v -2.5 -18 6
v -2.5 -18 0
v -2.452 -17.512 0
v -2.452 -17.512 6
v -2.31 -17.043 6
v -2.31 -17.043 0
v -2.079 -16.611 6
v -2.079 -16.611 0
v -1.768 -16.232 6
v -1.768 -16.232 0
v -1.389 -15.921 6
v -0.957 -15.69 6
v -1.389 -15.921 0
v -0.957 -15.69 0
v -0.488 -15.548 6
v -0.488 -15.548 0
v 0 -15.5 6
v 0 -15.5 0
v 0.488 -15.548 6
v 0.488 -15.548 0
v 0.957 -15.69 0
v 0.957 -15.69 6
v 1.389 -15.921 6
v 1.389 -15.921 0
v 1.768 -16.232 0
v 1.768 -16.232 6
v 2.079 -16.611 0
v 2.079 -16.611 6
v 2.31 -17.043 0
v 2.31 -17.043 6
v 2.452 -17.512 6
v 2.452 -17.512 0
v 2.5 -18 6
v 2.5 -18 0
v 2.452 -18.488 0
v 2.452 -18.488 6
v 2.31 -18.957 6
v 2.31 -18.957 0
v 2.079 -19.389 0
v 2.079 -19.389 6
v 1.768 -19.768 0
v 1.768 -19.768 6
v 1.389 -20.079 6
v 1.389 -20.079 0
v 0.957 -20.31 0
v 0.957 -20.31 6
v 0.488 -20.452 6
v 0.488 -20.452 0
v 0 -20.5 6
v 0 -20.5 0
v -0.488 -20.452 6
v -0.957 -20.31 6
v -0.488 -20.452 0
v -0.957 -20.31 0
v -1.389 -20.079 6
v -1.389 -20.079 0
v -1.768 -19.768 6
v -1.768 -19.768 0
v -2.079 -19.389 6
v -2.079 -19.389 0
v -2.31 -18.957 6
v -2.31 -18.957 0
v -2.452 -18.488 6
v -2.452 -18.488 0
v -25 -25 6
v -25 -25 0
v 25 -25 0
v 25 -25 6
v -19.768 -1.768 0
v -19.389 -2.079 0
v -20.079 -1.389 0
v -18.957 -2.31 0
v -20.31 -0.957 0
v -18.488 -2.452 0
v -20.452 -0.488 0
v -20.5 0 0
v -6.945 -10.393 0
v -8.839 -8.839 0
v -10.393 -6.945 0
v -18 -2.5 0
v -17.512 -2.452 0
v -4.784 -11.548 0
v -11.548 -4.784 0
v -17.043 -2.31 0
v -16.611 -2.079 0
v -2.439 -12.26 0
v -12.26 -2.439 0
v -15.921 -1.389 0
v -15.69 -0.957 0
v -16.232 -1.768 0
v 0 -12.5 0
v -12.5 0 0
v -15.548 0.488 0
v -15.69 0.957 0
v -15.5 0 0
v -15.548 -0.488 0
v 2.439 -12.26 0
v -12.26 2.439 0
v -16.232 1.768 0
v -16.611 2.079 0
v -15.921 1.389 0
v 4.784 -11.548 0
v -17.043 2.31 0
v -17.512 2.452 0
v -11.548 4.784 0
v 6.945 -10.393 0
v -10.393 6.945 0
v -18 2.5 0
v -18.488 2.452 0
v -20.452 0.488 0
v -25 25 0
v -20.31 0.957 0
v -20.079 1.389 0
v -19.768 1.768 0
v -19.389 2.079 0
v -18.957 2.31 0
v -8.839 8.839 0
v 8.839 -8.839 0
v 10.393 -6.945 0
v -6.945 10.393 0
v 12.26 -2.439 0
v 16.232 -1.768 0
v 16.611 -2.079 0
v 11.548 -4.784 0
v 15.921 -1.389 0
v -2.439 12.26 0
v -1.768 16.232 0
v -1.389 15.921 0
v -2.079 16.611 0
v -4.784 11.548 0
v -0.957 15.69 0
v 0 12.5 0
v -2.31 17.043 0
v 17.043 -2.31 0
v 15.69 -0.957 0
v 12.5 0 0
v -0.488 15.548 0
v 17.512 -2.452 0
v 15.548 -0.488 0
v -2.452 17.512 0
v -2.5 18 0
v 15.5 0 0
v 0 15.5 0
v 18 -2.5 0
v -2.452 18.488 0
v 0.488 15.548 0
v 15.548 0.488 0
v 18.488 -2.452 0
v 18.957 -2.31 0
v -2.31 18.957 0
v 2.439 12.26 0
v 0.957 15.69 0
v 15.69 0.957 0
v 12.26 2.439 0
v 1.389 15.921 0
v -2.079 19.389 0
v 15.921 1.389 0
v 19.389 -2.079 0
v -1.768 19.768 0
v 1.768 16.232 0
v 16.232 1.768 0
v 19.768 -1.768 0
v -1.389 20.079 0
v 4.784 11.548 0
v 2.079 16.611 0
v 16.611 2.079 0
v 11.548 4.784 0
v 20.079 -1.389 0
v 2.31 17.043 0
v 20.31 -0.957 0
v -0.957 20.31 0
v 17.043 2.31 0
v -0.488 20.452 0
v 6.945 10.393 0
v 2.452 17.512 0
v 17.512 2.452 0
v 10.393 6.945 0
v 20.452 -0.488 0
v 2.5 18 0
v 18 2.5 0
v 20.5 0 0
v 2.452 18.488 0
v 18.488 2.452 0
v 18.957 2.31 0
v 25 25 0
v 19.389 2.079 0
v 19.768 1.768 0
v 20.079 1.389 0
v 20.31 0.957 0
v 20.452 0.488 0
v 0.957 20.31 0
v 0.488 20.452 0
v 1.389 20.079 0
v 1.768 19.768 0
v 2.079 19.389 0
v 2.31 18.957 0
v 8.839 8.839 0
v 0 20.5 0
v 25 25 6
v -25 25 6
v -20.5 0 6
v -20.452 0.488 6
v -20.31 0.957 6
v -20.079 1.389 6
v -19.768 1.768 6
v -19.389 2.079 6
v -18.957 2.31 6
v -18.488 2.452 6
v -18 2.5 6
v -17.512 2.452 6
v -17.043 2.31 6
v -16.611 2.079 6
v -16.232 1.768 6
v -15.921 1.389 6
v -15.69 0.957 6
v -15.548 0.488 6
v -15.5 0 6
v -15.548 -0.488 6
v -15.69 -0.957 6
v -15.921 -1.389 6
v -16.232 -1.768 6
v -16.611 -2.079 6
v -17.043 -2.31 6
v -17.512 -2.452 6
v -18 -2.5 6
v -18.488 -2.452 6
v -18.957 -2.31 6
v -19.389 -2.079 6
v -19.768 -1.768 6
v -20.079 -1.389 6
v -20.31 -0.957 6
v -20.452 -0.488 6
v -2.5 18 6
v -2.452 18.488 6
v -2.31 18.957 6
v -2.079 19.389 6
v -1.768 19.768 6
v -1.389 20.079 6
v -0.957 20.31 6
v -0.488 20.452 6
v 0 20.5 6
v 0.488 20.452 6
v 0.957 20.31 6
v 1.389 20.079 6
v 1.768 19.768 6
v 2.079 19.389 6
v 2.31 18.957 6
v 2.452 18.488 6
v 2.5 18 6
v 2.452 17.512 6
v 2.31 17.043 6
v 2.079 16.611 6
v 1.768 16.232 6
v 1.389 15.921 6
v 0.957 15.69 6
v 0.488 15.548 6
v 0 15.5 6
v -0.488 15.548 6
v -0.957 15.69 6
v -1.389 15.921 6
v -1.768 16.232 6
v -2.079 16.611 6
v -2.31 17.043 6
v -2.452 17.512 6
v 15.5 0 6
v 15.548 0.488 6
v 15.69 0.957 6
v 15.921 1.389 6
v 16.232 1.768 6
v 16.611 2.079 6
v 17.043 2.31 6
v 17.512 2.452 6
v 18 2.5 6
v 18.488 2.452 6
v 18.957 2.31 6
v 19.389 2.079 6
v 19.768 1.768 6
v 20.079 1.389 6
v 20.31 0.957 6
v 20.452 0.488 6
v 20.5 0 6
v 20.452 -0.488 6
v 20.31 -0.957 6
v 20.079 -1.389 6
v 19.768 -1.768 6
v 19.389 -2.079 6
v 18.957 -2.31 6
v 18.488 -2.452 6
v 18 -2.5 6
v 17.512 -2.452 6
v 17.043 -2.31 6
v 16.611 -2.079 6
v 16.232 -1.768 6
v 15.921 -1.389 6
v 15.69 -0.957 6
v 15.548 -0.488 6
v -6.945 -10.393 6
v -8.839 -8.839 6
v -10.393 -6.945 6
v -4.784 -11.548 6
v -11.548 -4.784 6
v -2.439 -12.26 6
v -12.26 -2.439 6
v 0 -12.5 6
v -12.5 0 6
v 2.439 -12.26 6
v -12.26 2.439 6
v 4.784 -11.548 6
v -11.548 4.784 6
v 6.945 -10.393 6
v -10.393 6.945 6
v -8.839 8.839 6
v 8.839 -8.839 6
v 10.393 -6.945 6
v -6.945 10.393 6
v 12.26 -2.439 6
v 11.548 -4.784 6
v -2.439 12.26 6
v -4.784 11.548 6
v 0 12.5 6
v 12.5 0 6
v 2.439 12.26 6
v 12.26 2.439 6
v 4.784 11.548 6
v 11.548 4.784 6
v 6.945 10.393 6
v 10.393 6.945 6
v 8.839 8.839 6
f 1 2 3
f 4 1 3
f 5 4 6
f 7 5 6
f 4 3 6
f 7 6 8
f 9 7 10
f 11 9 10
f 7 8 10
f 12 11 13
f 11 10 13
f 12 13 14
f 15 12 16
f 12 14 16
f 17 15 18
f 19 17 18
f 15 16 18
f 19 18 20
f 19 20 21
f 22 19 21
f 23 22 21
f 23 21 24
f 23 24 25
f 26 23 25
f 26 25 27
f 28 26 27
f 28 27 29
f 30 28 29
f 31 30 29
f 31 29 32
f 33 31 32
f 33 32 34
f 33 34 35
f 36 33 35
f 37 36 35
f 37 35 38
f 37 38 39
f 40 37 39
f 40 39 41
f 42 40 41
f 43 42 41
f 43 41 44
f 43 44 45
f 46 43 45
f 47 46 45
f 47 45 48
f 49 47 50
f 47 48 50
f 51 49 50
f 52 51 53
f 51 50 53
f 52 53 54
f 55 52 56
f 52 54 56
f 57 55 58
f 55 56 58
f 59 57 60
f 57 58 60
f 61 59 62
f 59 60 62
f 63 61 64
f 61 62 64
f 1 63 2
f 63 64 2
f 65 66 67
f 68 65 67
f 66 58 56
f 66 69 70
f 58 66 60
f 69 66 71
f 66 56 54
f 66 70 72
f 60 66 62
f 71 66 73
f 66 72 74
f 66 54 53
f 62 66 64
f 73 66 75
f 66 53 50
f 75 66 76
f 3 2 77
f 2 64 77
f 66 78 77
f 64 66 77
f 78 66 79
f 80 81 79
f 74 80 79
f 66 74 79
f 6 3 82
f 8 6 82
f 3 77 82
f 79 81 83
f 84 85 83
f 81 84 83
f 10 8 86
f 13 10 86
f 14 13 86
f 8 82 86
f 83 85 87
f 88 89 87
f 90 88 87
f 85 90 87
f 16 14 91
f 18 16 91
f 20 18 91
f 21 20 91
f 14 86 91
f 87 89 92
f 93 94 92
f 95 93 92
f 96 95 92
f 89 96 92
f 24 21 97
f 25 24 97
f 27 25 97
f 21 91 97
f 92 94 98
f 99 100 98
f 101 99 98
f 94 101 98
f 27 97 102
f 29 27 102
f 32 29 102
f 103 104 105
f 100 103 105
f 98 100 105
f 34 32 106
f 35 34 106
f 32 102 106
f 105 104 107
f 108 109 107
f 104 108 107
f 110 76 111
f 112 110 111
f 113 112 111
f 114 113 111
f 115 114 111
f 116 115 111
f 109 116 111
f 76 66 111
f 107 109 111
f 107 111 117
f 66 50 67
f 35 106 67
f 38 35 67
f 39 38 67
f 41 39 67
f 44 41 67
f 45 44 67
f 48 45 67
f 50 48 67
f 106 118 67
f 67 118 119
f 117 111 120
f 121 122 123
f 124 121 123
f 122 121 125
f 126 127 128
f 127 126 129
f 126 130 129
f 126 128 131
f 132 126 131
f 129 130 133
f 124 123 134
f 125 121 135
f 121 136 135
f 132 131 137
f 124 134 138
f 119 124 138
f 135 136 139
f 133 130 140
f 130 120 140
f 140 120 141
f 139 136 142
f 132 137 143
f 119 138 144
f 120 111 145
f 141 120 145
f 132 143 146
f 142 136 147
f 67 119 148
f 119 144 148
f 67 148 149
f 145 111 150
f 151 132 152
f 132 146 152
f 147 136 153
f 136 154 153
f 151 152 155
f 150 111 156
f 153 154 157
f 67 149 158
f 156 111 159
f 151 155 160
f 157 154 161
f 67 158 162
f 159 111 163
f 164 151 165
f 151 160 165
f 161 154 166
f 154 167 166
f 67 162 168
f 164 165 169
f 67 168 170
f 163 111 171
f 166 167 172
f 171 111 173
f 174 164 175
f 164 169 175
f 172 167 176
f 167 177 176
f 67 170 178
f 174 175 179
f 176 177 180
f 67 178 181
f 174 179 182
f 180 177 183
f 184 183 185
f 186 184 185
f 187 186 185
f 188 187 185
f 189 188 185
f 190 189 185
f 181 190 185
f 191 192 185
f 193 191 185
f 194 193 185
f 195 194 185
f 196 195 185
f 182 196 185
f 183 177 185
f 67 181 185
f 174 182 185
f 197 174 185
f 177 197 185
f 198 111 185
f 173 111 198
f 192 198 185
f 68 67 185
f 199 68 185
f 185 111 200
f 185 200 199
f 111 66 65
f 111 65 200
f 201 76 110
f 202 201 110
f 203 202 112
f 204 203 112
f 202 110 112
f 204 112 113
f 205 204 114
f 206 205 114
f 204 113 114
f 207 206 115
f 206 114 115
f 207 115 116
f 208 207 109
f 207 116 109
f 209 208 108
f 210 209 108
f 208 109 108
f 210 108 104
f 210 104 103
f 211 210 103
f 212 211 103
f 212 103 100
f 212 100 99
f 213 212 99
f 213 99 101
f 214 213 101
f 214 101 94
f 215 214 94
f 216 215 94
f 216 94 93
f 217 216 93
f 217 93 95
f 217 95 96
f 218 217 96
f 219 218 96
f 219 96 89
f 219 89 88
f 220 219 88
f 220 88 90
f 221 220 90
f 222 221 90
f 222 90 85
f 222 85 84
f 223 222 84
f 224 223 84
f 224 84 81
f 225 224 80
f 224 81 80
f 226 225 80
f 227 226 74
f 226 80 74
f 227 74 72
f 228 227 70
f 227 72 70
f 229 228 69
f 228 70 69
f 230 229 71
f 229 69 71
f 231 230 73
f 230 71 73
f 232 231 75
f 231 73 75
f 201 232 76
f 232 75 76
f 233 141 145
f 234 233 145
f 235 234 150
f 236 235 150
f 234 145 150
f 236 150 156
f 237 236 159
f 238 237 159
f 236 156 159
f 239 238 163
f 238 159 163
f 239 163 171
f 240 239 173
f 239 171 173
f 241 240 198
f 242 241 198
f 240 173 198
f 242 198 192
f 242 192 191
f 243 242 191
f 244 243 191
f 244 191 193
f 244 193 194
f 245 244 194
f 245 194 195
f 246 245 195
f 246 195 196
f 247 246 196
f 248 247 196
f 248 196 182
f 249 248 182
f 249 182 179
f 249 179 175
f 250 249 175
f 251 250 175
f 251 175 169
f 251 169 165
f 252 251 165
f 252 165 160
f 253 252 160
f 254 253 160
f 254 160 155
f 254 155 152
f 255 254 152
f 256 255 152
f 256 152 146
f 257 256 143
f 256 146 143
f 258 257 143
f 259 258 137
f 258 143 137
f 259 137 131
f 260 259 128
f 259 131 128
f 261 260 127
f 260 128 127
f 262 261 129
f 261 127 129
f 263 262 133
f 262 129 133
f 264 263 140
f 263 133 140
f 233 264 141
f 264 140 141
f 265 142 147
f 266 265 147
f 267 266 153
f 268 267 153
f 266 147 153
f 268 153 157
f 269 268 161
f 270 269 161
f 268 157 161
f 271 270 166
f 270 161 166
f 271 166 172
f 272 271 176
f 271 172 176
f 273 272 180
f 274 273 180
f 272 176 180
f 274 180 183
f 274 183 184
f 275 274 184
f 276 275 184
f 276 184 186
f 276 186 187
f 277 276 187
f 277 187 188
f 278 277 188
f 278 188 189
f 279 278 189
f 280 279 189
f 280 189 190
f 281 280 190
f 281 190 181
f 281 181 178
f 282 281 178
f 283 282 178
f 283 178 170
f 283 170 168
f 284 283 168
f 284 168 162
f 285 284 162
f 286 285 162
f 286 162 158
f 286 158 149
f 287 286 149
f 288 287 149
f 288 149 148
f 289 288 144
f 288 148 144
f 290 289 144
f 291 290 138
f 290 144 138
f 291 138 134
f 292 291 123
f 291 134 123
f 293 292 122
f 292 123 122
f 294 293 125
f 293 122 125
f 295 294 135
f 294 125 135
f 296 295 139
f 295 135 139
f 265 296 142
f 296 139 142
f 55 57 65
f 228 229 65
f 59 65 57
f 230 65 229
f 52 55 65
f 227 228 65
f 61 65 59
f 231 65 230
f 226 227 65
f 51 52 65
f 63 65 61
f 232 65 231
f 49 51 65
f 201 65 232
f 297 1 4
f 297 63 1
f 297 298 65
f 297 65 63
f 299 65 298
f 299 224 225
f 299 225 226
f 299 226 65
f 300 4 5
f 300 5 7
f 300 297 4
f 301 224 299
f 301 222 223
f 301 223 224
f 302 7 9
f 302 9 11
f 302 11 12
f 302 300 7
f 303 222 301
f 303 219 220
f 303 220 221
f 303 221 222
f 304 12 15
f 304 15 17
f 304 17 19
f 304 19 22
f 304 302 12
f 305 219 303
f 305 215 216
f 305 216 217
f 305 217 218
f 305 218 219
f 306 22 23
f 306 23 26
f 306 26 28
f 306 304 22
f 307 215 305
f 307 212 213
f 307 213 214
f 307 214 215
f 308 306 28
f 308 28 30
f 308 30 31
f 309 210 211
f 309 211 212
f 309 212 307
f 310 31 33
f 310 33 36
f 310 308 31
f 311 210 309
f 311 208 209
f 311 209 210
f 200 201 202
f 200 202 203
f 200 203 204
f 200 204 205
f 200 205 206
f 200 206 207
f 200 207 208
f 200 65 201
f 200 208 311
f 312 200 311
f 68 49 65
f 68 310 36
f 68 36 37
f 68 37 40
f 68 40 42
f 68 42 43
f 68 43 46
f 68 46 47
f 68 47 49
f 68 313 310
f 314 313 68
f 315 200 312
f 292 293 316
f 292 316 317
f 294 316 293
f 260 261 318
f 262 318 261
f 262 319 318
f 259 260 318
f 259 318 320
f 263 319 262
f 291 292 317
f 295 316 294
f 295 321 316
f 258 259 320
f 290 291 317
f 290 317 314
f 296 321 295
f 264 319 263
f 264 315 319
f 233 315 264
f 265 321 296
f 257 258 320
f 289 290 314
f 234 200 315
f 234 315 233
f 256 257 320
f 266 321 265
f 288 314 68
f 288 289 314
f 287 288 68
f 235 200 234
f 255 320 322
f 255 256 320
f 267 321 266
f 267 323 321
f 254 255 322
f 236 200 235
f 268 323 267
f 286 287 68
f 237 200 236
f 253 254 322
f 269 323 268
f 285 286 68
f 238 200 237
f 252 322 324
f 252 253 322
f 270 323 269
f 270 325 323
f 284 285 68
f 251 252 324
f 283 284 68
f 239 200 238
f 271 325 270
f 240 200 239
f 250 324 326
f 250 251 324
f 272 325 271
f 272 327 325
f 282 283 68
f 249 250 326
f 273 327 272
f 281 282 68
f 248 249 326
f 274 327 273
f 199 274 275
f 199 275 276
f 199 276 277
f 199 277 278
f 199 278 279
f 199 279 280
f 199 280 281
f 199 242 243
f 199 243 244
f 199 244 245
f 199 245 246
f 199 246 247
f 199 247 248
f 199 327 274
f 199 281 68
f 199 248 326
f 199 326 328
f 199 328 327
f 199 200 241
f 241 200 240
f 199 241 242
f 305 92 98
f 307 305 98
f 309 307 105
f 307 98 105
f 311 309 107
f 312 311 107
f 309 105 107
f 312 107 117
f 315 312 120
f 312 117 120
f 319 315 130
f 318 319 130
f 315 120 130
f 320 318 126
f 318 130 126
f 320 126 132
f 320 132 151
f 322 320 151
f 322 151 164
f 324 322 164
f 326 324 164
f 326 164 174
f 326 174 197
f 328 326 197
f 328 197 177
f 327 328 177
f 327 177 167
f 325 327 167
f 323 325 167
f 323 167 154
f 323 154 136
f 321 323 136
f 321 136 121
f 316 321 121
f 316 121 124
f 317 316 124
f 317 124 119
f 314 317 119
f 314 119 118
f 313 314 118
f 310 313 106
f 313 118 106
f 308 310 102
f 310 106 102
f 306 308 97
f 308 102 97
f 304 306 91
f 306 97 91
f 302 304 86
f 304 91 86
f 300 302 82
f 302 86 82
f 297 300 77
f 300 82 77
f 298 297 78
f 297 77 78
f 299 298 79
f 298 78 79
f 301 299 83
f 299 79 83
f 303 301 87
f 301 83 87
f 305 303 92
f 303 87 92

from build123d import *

# Parameters (mm, degrees)
F0_W     = 50
F0_H     = 50
F1_DEPTH = 6
F3_D     = 5
F5_D     = 25


with BuildPart() as f1:
    # F0 (on Top) → F1 (new body)
    with BuildSketch(Plane.XY):
        Rectangle(F0_W, F0_H)
    extrude(amount=F1_DEPTH)

    # F3 (through all)
    with Locations(Plane.XY.offset(6)):
        with Locations((0, 18), (18, 0), (0, -18), (-18, 0)):
            Hole(F3_D / 2)

    # F5 (through all)
    with Locations(Plane.XY.offset(6)):
        with Locations((0, 0)):
            Hole(F5_D / 2)


solid = f1.part
